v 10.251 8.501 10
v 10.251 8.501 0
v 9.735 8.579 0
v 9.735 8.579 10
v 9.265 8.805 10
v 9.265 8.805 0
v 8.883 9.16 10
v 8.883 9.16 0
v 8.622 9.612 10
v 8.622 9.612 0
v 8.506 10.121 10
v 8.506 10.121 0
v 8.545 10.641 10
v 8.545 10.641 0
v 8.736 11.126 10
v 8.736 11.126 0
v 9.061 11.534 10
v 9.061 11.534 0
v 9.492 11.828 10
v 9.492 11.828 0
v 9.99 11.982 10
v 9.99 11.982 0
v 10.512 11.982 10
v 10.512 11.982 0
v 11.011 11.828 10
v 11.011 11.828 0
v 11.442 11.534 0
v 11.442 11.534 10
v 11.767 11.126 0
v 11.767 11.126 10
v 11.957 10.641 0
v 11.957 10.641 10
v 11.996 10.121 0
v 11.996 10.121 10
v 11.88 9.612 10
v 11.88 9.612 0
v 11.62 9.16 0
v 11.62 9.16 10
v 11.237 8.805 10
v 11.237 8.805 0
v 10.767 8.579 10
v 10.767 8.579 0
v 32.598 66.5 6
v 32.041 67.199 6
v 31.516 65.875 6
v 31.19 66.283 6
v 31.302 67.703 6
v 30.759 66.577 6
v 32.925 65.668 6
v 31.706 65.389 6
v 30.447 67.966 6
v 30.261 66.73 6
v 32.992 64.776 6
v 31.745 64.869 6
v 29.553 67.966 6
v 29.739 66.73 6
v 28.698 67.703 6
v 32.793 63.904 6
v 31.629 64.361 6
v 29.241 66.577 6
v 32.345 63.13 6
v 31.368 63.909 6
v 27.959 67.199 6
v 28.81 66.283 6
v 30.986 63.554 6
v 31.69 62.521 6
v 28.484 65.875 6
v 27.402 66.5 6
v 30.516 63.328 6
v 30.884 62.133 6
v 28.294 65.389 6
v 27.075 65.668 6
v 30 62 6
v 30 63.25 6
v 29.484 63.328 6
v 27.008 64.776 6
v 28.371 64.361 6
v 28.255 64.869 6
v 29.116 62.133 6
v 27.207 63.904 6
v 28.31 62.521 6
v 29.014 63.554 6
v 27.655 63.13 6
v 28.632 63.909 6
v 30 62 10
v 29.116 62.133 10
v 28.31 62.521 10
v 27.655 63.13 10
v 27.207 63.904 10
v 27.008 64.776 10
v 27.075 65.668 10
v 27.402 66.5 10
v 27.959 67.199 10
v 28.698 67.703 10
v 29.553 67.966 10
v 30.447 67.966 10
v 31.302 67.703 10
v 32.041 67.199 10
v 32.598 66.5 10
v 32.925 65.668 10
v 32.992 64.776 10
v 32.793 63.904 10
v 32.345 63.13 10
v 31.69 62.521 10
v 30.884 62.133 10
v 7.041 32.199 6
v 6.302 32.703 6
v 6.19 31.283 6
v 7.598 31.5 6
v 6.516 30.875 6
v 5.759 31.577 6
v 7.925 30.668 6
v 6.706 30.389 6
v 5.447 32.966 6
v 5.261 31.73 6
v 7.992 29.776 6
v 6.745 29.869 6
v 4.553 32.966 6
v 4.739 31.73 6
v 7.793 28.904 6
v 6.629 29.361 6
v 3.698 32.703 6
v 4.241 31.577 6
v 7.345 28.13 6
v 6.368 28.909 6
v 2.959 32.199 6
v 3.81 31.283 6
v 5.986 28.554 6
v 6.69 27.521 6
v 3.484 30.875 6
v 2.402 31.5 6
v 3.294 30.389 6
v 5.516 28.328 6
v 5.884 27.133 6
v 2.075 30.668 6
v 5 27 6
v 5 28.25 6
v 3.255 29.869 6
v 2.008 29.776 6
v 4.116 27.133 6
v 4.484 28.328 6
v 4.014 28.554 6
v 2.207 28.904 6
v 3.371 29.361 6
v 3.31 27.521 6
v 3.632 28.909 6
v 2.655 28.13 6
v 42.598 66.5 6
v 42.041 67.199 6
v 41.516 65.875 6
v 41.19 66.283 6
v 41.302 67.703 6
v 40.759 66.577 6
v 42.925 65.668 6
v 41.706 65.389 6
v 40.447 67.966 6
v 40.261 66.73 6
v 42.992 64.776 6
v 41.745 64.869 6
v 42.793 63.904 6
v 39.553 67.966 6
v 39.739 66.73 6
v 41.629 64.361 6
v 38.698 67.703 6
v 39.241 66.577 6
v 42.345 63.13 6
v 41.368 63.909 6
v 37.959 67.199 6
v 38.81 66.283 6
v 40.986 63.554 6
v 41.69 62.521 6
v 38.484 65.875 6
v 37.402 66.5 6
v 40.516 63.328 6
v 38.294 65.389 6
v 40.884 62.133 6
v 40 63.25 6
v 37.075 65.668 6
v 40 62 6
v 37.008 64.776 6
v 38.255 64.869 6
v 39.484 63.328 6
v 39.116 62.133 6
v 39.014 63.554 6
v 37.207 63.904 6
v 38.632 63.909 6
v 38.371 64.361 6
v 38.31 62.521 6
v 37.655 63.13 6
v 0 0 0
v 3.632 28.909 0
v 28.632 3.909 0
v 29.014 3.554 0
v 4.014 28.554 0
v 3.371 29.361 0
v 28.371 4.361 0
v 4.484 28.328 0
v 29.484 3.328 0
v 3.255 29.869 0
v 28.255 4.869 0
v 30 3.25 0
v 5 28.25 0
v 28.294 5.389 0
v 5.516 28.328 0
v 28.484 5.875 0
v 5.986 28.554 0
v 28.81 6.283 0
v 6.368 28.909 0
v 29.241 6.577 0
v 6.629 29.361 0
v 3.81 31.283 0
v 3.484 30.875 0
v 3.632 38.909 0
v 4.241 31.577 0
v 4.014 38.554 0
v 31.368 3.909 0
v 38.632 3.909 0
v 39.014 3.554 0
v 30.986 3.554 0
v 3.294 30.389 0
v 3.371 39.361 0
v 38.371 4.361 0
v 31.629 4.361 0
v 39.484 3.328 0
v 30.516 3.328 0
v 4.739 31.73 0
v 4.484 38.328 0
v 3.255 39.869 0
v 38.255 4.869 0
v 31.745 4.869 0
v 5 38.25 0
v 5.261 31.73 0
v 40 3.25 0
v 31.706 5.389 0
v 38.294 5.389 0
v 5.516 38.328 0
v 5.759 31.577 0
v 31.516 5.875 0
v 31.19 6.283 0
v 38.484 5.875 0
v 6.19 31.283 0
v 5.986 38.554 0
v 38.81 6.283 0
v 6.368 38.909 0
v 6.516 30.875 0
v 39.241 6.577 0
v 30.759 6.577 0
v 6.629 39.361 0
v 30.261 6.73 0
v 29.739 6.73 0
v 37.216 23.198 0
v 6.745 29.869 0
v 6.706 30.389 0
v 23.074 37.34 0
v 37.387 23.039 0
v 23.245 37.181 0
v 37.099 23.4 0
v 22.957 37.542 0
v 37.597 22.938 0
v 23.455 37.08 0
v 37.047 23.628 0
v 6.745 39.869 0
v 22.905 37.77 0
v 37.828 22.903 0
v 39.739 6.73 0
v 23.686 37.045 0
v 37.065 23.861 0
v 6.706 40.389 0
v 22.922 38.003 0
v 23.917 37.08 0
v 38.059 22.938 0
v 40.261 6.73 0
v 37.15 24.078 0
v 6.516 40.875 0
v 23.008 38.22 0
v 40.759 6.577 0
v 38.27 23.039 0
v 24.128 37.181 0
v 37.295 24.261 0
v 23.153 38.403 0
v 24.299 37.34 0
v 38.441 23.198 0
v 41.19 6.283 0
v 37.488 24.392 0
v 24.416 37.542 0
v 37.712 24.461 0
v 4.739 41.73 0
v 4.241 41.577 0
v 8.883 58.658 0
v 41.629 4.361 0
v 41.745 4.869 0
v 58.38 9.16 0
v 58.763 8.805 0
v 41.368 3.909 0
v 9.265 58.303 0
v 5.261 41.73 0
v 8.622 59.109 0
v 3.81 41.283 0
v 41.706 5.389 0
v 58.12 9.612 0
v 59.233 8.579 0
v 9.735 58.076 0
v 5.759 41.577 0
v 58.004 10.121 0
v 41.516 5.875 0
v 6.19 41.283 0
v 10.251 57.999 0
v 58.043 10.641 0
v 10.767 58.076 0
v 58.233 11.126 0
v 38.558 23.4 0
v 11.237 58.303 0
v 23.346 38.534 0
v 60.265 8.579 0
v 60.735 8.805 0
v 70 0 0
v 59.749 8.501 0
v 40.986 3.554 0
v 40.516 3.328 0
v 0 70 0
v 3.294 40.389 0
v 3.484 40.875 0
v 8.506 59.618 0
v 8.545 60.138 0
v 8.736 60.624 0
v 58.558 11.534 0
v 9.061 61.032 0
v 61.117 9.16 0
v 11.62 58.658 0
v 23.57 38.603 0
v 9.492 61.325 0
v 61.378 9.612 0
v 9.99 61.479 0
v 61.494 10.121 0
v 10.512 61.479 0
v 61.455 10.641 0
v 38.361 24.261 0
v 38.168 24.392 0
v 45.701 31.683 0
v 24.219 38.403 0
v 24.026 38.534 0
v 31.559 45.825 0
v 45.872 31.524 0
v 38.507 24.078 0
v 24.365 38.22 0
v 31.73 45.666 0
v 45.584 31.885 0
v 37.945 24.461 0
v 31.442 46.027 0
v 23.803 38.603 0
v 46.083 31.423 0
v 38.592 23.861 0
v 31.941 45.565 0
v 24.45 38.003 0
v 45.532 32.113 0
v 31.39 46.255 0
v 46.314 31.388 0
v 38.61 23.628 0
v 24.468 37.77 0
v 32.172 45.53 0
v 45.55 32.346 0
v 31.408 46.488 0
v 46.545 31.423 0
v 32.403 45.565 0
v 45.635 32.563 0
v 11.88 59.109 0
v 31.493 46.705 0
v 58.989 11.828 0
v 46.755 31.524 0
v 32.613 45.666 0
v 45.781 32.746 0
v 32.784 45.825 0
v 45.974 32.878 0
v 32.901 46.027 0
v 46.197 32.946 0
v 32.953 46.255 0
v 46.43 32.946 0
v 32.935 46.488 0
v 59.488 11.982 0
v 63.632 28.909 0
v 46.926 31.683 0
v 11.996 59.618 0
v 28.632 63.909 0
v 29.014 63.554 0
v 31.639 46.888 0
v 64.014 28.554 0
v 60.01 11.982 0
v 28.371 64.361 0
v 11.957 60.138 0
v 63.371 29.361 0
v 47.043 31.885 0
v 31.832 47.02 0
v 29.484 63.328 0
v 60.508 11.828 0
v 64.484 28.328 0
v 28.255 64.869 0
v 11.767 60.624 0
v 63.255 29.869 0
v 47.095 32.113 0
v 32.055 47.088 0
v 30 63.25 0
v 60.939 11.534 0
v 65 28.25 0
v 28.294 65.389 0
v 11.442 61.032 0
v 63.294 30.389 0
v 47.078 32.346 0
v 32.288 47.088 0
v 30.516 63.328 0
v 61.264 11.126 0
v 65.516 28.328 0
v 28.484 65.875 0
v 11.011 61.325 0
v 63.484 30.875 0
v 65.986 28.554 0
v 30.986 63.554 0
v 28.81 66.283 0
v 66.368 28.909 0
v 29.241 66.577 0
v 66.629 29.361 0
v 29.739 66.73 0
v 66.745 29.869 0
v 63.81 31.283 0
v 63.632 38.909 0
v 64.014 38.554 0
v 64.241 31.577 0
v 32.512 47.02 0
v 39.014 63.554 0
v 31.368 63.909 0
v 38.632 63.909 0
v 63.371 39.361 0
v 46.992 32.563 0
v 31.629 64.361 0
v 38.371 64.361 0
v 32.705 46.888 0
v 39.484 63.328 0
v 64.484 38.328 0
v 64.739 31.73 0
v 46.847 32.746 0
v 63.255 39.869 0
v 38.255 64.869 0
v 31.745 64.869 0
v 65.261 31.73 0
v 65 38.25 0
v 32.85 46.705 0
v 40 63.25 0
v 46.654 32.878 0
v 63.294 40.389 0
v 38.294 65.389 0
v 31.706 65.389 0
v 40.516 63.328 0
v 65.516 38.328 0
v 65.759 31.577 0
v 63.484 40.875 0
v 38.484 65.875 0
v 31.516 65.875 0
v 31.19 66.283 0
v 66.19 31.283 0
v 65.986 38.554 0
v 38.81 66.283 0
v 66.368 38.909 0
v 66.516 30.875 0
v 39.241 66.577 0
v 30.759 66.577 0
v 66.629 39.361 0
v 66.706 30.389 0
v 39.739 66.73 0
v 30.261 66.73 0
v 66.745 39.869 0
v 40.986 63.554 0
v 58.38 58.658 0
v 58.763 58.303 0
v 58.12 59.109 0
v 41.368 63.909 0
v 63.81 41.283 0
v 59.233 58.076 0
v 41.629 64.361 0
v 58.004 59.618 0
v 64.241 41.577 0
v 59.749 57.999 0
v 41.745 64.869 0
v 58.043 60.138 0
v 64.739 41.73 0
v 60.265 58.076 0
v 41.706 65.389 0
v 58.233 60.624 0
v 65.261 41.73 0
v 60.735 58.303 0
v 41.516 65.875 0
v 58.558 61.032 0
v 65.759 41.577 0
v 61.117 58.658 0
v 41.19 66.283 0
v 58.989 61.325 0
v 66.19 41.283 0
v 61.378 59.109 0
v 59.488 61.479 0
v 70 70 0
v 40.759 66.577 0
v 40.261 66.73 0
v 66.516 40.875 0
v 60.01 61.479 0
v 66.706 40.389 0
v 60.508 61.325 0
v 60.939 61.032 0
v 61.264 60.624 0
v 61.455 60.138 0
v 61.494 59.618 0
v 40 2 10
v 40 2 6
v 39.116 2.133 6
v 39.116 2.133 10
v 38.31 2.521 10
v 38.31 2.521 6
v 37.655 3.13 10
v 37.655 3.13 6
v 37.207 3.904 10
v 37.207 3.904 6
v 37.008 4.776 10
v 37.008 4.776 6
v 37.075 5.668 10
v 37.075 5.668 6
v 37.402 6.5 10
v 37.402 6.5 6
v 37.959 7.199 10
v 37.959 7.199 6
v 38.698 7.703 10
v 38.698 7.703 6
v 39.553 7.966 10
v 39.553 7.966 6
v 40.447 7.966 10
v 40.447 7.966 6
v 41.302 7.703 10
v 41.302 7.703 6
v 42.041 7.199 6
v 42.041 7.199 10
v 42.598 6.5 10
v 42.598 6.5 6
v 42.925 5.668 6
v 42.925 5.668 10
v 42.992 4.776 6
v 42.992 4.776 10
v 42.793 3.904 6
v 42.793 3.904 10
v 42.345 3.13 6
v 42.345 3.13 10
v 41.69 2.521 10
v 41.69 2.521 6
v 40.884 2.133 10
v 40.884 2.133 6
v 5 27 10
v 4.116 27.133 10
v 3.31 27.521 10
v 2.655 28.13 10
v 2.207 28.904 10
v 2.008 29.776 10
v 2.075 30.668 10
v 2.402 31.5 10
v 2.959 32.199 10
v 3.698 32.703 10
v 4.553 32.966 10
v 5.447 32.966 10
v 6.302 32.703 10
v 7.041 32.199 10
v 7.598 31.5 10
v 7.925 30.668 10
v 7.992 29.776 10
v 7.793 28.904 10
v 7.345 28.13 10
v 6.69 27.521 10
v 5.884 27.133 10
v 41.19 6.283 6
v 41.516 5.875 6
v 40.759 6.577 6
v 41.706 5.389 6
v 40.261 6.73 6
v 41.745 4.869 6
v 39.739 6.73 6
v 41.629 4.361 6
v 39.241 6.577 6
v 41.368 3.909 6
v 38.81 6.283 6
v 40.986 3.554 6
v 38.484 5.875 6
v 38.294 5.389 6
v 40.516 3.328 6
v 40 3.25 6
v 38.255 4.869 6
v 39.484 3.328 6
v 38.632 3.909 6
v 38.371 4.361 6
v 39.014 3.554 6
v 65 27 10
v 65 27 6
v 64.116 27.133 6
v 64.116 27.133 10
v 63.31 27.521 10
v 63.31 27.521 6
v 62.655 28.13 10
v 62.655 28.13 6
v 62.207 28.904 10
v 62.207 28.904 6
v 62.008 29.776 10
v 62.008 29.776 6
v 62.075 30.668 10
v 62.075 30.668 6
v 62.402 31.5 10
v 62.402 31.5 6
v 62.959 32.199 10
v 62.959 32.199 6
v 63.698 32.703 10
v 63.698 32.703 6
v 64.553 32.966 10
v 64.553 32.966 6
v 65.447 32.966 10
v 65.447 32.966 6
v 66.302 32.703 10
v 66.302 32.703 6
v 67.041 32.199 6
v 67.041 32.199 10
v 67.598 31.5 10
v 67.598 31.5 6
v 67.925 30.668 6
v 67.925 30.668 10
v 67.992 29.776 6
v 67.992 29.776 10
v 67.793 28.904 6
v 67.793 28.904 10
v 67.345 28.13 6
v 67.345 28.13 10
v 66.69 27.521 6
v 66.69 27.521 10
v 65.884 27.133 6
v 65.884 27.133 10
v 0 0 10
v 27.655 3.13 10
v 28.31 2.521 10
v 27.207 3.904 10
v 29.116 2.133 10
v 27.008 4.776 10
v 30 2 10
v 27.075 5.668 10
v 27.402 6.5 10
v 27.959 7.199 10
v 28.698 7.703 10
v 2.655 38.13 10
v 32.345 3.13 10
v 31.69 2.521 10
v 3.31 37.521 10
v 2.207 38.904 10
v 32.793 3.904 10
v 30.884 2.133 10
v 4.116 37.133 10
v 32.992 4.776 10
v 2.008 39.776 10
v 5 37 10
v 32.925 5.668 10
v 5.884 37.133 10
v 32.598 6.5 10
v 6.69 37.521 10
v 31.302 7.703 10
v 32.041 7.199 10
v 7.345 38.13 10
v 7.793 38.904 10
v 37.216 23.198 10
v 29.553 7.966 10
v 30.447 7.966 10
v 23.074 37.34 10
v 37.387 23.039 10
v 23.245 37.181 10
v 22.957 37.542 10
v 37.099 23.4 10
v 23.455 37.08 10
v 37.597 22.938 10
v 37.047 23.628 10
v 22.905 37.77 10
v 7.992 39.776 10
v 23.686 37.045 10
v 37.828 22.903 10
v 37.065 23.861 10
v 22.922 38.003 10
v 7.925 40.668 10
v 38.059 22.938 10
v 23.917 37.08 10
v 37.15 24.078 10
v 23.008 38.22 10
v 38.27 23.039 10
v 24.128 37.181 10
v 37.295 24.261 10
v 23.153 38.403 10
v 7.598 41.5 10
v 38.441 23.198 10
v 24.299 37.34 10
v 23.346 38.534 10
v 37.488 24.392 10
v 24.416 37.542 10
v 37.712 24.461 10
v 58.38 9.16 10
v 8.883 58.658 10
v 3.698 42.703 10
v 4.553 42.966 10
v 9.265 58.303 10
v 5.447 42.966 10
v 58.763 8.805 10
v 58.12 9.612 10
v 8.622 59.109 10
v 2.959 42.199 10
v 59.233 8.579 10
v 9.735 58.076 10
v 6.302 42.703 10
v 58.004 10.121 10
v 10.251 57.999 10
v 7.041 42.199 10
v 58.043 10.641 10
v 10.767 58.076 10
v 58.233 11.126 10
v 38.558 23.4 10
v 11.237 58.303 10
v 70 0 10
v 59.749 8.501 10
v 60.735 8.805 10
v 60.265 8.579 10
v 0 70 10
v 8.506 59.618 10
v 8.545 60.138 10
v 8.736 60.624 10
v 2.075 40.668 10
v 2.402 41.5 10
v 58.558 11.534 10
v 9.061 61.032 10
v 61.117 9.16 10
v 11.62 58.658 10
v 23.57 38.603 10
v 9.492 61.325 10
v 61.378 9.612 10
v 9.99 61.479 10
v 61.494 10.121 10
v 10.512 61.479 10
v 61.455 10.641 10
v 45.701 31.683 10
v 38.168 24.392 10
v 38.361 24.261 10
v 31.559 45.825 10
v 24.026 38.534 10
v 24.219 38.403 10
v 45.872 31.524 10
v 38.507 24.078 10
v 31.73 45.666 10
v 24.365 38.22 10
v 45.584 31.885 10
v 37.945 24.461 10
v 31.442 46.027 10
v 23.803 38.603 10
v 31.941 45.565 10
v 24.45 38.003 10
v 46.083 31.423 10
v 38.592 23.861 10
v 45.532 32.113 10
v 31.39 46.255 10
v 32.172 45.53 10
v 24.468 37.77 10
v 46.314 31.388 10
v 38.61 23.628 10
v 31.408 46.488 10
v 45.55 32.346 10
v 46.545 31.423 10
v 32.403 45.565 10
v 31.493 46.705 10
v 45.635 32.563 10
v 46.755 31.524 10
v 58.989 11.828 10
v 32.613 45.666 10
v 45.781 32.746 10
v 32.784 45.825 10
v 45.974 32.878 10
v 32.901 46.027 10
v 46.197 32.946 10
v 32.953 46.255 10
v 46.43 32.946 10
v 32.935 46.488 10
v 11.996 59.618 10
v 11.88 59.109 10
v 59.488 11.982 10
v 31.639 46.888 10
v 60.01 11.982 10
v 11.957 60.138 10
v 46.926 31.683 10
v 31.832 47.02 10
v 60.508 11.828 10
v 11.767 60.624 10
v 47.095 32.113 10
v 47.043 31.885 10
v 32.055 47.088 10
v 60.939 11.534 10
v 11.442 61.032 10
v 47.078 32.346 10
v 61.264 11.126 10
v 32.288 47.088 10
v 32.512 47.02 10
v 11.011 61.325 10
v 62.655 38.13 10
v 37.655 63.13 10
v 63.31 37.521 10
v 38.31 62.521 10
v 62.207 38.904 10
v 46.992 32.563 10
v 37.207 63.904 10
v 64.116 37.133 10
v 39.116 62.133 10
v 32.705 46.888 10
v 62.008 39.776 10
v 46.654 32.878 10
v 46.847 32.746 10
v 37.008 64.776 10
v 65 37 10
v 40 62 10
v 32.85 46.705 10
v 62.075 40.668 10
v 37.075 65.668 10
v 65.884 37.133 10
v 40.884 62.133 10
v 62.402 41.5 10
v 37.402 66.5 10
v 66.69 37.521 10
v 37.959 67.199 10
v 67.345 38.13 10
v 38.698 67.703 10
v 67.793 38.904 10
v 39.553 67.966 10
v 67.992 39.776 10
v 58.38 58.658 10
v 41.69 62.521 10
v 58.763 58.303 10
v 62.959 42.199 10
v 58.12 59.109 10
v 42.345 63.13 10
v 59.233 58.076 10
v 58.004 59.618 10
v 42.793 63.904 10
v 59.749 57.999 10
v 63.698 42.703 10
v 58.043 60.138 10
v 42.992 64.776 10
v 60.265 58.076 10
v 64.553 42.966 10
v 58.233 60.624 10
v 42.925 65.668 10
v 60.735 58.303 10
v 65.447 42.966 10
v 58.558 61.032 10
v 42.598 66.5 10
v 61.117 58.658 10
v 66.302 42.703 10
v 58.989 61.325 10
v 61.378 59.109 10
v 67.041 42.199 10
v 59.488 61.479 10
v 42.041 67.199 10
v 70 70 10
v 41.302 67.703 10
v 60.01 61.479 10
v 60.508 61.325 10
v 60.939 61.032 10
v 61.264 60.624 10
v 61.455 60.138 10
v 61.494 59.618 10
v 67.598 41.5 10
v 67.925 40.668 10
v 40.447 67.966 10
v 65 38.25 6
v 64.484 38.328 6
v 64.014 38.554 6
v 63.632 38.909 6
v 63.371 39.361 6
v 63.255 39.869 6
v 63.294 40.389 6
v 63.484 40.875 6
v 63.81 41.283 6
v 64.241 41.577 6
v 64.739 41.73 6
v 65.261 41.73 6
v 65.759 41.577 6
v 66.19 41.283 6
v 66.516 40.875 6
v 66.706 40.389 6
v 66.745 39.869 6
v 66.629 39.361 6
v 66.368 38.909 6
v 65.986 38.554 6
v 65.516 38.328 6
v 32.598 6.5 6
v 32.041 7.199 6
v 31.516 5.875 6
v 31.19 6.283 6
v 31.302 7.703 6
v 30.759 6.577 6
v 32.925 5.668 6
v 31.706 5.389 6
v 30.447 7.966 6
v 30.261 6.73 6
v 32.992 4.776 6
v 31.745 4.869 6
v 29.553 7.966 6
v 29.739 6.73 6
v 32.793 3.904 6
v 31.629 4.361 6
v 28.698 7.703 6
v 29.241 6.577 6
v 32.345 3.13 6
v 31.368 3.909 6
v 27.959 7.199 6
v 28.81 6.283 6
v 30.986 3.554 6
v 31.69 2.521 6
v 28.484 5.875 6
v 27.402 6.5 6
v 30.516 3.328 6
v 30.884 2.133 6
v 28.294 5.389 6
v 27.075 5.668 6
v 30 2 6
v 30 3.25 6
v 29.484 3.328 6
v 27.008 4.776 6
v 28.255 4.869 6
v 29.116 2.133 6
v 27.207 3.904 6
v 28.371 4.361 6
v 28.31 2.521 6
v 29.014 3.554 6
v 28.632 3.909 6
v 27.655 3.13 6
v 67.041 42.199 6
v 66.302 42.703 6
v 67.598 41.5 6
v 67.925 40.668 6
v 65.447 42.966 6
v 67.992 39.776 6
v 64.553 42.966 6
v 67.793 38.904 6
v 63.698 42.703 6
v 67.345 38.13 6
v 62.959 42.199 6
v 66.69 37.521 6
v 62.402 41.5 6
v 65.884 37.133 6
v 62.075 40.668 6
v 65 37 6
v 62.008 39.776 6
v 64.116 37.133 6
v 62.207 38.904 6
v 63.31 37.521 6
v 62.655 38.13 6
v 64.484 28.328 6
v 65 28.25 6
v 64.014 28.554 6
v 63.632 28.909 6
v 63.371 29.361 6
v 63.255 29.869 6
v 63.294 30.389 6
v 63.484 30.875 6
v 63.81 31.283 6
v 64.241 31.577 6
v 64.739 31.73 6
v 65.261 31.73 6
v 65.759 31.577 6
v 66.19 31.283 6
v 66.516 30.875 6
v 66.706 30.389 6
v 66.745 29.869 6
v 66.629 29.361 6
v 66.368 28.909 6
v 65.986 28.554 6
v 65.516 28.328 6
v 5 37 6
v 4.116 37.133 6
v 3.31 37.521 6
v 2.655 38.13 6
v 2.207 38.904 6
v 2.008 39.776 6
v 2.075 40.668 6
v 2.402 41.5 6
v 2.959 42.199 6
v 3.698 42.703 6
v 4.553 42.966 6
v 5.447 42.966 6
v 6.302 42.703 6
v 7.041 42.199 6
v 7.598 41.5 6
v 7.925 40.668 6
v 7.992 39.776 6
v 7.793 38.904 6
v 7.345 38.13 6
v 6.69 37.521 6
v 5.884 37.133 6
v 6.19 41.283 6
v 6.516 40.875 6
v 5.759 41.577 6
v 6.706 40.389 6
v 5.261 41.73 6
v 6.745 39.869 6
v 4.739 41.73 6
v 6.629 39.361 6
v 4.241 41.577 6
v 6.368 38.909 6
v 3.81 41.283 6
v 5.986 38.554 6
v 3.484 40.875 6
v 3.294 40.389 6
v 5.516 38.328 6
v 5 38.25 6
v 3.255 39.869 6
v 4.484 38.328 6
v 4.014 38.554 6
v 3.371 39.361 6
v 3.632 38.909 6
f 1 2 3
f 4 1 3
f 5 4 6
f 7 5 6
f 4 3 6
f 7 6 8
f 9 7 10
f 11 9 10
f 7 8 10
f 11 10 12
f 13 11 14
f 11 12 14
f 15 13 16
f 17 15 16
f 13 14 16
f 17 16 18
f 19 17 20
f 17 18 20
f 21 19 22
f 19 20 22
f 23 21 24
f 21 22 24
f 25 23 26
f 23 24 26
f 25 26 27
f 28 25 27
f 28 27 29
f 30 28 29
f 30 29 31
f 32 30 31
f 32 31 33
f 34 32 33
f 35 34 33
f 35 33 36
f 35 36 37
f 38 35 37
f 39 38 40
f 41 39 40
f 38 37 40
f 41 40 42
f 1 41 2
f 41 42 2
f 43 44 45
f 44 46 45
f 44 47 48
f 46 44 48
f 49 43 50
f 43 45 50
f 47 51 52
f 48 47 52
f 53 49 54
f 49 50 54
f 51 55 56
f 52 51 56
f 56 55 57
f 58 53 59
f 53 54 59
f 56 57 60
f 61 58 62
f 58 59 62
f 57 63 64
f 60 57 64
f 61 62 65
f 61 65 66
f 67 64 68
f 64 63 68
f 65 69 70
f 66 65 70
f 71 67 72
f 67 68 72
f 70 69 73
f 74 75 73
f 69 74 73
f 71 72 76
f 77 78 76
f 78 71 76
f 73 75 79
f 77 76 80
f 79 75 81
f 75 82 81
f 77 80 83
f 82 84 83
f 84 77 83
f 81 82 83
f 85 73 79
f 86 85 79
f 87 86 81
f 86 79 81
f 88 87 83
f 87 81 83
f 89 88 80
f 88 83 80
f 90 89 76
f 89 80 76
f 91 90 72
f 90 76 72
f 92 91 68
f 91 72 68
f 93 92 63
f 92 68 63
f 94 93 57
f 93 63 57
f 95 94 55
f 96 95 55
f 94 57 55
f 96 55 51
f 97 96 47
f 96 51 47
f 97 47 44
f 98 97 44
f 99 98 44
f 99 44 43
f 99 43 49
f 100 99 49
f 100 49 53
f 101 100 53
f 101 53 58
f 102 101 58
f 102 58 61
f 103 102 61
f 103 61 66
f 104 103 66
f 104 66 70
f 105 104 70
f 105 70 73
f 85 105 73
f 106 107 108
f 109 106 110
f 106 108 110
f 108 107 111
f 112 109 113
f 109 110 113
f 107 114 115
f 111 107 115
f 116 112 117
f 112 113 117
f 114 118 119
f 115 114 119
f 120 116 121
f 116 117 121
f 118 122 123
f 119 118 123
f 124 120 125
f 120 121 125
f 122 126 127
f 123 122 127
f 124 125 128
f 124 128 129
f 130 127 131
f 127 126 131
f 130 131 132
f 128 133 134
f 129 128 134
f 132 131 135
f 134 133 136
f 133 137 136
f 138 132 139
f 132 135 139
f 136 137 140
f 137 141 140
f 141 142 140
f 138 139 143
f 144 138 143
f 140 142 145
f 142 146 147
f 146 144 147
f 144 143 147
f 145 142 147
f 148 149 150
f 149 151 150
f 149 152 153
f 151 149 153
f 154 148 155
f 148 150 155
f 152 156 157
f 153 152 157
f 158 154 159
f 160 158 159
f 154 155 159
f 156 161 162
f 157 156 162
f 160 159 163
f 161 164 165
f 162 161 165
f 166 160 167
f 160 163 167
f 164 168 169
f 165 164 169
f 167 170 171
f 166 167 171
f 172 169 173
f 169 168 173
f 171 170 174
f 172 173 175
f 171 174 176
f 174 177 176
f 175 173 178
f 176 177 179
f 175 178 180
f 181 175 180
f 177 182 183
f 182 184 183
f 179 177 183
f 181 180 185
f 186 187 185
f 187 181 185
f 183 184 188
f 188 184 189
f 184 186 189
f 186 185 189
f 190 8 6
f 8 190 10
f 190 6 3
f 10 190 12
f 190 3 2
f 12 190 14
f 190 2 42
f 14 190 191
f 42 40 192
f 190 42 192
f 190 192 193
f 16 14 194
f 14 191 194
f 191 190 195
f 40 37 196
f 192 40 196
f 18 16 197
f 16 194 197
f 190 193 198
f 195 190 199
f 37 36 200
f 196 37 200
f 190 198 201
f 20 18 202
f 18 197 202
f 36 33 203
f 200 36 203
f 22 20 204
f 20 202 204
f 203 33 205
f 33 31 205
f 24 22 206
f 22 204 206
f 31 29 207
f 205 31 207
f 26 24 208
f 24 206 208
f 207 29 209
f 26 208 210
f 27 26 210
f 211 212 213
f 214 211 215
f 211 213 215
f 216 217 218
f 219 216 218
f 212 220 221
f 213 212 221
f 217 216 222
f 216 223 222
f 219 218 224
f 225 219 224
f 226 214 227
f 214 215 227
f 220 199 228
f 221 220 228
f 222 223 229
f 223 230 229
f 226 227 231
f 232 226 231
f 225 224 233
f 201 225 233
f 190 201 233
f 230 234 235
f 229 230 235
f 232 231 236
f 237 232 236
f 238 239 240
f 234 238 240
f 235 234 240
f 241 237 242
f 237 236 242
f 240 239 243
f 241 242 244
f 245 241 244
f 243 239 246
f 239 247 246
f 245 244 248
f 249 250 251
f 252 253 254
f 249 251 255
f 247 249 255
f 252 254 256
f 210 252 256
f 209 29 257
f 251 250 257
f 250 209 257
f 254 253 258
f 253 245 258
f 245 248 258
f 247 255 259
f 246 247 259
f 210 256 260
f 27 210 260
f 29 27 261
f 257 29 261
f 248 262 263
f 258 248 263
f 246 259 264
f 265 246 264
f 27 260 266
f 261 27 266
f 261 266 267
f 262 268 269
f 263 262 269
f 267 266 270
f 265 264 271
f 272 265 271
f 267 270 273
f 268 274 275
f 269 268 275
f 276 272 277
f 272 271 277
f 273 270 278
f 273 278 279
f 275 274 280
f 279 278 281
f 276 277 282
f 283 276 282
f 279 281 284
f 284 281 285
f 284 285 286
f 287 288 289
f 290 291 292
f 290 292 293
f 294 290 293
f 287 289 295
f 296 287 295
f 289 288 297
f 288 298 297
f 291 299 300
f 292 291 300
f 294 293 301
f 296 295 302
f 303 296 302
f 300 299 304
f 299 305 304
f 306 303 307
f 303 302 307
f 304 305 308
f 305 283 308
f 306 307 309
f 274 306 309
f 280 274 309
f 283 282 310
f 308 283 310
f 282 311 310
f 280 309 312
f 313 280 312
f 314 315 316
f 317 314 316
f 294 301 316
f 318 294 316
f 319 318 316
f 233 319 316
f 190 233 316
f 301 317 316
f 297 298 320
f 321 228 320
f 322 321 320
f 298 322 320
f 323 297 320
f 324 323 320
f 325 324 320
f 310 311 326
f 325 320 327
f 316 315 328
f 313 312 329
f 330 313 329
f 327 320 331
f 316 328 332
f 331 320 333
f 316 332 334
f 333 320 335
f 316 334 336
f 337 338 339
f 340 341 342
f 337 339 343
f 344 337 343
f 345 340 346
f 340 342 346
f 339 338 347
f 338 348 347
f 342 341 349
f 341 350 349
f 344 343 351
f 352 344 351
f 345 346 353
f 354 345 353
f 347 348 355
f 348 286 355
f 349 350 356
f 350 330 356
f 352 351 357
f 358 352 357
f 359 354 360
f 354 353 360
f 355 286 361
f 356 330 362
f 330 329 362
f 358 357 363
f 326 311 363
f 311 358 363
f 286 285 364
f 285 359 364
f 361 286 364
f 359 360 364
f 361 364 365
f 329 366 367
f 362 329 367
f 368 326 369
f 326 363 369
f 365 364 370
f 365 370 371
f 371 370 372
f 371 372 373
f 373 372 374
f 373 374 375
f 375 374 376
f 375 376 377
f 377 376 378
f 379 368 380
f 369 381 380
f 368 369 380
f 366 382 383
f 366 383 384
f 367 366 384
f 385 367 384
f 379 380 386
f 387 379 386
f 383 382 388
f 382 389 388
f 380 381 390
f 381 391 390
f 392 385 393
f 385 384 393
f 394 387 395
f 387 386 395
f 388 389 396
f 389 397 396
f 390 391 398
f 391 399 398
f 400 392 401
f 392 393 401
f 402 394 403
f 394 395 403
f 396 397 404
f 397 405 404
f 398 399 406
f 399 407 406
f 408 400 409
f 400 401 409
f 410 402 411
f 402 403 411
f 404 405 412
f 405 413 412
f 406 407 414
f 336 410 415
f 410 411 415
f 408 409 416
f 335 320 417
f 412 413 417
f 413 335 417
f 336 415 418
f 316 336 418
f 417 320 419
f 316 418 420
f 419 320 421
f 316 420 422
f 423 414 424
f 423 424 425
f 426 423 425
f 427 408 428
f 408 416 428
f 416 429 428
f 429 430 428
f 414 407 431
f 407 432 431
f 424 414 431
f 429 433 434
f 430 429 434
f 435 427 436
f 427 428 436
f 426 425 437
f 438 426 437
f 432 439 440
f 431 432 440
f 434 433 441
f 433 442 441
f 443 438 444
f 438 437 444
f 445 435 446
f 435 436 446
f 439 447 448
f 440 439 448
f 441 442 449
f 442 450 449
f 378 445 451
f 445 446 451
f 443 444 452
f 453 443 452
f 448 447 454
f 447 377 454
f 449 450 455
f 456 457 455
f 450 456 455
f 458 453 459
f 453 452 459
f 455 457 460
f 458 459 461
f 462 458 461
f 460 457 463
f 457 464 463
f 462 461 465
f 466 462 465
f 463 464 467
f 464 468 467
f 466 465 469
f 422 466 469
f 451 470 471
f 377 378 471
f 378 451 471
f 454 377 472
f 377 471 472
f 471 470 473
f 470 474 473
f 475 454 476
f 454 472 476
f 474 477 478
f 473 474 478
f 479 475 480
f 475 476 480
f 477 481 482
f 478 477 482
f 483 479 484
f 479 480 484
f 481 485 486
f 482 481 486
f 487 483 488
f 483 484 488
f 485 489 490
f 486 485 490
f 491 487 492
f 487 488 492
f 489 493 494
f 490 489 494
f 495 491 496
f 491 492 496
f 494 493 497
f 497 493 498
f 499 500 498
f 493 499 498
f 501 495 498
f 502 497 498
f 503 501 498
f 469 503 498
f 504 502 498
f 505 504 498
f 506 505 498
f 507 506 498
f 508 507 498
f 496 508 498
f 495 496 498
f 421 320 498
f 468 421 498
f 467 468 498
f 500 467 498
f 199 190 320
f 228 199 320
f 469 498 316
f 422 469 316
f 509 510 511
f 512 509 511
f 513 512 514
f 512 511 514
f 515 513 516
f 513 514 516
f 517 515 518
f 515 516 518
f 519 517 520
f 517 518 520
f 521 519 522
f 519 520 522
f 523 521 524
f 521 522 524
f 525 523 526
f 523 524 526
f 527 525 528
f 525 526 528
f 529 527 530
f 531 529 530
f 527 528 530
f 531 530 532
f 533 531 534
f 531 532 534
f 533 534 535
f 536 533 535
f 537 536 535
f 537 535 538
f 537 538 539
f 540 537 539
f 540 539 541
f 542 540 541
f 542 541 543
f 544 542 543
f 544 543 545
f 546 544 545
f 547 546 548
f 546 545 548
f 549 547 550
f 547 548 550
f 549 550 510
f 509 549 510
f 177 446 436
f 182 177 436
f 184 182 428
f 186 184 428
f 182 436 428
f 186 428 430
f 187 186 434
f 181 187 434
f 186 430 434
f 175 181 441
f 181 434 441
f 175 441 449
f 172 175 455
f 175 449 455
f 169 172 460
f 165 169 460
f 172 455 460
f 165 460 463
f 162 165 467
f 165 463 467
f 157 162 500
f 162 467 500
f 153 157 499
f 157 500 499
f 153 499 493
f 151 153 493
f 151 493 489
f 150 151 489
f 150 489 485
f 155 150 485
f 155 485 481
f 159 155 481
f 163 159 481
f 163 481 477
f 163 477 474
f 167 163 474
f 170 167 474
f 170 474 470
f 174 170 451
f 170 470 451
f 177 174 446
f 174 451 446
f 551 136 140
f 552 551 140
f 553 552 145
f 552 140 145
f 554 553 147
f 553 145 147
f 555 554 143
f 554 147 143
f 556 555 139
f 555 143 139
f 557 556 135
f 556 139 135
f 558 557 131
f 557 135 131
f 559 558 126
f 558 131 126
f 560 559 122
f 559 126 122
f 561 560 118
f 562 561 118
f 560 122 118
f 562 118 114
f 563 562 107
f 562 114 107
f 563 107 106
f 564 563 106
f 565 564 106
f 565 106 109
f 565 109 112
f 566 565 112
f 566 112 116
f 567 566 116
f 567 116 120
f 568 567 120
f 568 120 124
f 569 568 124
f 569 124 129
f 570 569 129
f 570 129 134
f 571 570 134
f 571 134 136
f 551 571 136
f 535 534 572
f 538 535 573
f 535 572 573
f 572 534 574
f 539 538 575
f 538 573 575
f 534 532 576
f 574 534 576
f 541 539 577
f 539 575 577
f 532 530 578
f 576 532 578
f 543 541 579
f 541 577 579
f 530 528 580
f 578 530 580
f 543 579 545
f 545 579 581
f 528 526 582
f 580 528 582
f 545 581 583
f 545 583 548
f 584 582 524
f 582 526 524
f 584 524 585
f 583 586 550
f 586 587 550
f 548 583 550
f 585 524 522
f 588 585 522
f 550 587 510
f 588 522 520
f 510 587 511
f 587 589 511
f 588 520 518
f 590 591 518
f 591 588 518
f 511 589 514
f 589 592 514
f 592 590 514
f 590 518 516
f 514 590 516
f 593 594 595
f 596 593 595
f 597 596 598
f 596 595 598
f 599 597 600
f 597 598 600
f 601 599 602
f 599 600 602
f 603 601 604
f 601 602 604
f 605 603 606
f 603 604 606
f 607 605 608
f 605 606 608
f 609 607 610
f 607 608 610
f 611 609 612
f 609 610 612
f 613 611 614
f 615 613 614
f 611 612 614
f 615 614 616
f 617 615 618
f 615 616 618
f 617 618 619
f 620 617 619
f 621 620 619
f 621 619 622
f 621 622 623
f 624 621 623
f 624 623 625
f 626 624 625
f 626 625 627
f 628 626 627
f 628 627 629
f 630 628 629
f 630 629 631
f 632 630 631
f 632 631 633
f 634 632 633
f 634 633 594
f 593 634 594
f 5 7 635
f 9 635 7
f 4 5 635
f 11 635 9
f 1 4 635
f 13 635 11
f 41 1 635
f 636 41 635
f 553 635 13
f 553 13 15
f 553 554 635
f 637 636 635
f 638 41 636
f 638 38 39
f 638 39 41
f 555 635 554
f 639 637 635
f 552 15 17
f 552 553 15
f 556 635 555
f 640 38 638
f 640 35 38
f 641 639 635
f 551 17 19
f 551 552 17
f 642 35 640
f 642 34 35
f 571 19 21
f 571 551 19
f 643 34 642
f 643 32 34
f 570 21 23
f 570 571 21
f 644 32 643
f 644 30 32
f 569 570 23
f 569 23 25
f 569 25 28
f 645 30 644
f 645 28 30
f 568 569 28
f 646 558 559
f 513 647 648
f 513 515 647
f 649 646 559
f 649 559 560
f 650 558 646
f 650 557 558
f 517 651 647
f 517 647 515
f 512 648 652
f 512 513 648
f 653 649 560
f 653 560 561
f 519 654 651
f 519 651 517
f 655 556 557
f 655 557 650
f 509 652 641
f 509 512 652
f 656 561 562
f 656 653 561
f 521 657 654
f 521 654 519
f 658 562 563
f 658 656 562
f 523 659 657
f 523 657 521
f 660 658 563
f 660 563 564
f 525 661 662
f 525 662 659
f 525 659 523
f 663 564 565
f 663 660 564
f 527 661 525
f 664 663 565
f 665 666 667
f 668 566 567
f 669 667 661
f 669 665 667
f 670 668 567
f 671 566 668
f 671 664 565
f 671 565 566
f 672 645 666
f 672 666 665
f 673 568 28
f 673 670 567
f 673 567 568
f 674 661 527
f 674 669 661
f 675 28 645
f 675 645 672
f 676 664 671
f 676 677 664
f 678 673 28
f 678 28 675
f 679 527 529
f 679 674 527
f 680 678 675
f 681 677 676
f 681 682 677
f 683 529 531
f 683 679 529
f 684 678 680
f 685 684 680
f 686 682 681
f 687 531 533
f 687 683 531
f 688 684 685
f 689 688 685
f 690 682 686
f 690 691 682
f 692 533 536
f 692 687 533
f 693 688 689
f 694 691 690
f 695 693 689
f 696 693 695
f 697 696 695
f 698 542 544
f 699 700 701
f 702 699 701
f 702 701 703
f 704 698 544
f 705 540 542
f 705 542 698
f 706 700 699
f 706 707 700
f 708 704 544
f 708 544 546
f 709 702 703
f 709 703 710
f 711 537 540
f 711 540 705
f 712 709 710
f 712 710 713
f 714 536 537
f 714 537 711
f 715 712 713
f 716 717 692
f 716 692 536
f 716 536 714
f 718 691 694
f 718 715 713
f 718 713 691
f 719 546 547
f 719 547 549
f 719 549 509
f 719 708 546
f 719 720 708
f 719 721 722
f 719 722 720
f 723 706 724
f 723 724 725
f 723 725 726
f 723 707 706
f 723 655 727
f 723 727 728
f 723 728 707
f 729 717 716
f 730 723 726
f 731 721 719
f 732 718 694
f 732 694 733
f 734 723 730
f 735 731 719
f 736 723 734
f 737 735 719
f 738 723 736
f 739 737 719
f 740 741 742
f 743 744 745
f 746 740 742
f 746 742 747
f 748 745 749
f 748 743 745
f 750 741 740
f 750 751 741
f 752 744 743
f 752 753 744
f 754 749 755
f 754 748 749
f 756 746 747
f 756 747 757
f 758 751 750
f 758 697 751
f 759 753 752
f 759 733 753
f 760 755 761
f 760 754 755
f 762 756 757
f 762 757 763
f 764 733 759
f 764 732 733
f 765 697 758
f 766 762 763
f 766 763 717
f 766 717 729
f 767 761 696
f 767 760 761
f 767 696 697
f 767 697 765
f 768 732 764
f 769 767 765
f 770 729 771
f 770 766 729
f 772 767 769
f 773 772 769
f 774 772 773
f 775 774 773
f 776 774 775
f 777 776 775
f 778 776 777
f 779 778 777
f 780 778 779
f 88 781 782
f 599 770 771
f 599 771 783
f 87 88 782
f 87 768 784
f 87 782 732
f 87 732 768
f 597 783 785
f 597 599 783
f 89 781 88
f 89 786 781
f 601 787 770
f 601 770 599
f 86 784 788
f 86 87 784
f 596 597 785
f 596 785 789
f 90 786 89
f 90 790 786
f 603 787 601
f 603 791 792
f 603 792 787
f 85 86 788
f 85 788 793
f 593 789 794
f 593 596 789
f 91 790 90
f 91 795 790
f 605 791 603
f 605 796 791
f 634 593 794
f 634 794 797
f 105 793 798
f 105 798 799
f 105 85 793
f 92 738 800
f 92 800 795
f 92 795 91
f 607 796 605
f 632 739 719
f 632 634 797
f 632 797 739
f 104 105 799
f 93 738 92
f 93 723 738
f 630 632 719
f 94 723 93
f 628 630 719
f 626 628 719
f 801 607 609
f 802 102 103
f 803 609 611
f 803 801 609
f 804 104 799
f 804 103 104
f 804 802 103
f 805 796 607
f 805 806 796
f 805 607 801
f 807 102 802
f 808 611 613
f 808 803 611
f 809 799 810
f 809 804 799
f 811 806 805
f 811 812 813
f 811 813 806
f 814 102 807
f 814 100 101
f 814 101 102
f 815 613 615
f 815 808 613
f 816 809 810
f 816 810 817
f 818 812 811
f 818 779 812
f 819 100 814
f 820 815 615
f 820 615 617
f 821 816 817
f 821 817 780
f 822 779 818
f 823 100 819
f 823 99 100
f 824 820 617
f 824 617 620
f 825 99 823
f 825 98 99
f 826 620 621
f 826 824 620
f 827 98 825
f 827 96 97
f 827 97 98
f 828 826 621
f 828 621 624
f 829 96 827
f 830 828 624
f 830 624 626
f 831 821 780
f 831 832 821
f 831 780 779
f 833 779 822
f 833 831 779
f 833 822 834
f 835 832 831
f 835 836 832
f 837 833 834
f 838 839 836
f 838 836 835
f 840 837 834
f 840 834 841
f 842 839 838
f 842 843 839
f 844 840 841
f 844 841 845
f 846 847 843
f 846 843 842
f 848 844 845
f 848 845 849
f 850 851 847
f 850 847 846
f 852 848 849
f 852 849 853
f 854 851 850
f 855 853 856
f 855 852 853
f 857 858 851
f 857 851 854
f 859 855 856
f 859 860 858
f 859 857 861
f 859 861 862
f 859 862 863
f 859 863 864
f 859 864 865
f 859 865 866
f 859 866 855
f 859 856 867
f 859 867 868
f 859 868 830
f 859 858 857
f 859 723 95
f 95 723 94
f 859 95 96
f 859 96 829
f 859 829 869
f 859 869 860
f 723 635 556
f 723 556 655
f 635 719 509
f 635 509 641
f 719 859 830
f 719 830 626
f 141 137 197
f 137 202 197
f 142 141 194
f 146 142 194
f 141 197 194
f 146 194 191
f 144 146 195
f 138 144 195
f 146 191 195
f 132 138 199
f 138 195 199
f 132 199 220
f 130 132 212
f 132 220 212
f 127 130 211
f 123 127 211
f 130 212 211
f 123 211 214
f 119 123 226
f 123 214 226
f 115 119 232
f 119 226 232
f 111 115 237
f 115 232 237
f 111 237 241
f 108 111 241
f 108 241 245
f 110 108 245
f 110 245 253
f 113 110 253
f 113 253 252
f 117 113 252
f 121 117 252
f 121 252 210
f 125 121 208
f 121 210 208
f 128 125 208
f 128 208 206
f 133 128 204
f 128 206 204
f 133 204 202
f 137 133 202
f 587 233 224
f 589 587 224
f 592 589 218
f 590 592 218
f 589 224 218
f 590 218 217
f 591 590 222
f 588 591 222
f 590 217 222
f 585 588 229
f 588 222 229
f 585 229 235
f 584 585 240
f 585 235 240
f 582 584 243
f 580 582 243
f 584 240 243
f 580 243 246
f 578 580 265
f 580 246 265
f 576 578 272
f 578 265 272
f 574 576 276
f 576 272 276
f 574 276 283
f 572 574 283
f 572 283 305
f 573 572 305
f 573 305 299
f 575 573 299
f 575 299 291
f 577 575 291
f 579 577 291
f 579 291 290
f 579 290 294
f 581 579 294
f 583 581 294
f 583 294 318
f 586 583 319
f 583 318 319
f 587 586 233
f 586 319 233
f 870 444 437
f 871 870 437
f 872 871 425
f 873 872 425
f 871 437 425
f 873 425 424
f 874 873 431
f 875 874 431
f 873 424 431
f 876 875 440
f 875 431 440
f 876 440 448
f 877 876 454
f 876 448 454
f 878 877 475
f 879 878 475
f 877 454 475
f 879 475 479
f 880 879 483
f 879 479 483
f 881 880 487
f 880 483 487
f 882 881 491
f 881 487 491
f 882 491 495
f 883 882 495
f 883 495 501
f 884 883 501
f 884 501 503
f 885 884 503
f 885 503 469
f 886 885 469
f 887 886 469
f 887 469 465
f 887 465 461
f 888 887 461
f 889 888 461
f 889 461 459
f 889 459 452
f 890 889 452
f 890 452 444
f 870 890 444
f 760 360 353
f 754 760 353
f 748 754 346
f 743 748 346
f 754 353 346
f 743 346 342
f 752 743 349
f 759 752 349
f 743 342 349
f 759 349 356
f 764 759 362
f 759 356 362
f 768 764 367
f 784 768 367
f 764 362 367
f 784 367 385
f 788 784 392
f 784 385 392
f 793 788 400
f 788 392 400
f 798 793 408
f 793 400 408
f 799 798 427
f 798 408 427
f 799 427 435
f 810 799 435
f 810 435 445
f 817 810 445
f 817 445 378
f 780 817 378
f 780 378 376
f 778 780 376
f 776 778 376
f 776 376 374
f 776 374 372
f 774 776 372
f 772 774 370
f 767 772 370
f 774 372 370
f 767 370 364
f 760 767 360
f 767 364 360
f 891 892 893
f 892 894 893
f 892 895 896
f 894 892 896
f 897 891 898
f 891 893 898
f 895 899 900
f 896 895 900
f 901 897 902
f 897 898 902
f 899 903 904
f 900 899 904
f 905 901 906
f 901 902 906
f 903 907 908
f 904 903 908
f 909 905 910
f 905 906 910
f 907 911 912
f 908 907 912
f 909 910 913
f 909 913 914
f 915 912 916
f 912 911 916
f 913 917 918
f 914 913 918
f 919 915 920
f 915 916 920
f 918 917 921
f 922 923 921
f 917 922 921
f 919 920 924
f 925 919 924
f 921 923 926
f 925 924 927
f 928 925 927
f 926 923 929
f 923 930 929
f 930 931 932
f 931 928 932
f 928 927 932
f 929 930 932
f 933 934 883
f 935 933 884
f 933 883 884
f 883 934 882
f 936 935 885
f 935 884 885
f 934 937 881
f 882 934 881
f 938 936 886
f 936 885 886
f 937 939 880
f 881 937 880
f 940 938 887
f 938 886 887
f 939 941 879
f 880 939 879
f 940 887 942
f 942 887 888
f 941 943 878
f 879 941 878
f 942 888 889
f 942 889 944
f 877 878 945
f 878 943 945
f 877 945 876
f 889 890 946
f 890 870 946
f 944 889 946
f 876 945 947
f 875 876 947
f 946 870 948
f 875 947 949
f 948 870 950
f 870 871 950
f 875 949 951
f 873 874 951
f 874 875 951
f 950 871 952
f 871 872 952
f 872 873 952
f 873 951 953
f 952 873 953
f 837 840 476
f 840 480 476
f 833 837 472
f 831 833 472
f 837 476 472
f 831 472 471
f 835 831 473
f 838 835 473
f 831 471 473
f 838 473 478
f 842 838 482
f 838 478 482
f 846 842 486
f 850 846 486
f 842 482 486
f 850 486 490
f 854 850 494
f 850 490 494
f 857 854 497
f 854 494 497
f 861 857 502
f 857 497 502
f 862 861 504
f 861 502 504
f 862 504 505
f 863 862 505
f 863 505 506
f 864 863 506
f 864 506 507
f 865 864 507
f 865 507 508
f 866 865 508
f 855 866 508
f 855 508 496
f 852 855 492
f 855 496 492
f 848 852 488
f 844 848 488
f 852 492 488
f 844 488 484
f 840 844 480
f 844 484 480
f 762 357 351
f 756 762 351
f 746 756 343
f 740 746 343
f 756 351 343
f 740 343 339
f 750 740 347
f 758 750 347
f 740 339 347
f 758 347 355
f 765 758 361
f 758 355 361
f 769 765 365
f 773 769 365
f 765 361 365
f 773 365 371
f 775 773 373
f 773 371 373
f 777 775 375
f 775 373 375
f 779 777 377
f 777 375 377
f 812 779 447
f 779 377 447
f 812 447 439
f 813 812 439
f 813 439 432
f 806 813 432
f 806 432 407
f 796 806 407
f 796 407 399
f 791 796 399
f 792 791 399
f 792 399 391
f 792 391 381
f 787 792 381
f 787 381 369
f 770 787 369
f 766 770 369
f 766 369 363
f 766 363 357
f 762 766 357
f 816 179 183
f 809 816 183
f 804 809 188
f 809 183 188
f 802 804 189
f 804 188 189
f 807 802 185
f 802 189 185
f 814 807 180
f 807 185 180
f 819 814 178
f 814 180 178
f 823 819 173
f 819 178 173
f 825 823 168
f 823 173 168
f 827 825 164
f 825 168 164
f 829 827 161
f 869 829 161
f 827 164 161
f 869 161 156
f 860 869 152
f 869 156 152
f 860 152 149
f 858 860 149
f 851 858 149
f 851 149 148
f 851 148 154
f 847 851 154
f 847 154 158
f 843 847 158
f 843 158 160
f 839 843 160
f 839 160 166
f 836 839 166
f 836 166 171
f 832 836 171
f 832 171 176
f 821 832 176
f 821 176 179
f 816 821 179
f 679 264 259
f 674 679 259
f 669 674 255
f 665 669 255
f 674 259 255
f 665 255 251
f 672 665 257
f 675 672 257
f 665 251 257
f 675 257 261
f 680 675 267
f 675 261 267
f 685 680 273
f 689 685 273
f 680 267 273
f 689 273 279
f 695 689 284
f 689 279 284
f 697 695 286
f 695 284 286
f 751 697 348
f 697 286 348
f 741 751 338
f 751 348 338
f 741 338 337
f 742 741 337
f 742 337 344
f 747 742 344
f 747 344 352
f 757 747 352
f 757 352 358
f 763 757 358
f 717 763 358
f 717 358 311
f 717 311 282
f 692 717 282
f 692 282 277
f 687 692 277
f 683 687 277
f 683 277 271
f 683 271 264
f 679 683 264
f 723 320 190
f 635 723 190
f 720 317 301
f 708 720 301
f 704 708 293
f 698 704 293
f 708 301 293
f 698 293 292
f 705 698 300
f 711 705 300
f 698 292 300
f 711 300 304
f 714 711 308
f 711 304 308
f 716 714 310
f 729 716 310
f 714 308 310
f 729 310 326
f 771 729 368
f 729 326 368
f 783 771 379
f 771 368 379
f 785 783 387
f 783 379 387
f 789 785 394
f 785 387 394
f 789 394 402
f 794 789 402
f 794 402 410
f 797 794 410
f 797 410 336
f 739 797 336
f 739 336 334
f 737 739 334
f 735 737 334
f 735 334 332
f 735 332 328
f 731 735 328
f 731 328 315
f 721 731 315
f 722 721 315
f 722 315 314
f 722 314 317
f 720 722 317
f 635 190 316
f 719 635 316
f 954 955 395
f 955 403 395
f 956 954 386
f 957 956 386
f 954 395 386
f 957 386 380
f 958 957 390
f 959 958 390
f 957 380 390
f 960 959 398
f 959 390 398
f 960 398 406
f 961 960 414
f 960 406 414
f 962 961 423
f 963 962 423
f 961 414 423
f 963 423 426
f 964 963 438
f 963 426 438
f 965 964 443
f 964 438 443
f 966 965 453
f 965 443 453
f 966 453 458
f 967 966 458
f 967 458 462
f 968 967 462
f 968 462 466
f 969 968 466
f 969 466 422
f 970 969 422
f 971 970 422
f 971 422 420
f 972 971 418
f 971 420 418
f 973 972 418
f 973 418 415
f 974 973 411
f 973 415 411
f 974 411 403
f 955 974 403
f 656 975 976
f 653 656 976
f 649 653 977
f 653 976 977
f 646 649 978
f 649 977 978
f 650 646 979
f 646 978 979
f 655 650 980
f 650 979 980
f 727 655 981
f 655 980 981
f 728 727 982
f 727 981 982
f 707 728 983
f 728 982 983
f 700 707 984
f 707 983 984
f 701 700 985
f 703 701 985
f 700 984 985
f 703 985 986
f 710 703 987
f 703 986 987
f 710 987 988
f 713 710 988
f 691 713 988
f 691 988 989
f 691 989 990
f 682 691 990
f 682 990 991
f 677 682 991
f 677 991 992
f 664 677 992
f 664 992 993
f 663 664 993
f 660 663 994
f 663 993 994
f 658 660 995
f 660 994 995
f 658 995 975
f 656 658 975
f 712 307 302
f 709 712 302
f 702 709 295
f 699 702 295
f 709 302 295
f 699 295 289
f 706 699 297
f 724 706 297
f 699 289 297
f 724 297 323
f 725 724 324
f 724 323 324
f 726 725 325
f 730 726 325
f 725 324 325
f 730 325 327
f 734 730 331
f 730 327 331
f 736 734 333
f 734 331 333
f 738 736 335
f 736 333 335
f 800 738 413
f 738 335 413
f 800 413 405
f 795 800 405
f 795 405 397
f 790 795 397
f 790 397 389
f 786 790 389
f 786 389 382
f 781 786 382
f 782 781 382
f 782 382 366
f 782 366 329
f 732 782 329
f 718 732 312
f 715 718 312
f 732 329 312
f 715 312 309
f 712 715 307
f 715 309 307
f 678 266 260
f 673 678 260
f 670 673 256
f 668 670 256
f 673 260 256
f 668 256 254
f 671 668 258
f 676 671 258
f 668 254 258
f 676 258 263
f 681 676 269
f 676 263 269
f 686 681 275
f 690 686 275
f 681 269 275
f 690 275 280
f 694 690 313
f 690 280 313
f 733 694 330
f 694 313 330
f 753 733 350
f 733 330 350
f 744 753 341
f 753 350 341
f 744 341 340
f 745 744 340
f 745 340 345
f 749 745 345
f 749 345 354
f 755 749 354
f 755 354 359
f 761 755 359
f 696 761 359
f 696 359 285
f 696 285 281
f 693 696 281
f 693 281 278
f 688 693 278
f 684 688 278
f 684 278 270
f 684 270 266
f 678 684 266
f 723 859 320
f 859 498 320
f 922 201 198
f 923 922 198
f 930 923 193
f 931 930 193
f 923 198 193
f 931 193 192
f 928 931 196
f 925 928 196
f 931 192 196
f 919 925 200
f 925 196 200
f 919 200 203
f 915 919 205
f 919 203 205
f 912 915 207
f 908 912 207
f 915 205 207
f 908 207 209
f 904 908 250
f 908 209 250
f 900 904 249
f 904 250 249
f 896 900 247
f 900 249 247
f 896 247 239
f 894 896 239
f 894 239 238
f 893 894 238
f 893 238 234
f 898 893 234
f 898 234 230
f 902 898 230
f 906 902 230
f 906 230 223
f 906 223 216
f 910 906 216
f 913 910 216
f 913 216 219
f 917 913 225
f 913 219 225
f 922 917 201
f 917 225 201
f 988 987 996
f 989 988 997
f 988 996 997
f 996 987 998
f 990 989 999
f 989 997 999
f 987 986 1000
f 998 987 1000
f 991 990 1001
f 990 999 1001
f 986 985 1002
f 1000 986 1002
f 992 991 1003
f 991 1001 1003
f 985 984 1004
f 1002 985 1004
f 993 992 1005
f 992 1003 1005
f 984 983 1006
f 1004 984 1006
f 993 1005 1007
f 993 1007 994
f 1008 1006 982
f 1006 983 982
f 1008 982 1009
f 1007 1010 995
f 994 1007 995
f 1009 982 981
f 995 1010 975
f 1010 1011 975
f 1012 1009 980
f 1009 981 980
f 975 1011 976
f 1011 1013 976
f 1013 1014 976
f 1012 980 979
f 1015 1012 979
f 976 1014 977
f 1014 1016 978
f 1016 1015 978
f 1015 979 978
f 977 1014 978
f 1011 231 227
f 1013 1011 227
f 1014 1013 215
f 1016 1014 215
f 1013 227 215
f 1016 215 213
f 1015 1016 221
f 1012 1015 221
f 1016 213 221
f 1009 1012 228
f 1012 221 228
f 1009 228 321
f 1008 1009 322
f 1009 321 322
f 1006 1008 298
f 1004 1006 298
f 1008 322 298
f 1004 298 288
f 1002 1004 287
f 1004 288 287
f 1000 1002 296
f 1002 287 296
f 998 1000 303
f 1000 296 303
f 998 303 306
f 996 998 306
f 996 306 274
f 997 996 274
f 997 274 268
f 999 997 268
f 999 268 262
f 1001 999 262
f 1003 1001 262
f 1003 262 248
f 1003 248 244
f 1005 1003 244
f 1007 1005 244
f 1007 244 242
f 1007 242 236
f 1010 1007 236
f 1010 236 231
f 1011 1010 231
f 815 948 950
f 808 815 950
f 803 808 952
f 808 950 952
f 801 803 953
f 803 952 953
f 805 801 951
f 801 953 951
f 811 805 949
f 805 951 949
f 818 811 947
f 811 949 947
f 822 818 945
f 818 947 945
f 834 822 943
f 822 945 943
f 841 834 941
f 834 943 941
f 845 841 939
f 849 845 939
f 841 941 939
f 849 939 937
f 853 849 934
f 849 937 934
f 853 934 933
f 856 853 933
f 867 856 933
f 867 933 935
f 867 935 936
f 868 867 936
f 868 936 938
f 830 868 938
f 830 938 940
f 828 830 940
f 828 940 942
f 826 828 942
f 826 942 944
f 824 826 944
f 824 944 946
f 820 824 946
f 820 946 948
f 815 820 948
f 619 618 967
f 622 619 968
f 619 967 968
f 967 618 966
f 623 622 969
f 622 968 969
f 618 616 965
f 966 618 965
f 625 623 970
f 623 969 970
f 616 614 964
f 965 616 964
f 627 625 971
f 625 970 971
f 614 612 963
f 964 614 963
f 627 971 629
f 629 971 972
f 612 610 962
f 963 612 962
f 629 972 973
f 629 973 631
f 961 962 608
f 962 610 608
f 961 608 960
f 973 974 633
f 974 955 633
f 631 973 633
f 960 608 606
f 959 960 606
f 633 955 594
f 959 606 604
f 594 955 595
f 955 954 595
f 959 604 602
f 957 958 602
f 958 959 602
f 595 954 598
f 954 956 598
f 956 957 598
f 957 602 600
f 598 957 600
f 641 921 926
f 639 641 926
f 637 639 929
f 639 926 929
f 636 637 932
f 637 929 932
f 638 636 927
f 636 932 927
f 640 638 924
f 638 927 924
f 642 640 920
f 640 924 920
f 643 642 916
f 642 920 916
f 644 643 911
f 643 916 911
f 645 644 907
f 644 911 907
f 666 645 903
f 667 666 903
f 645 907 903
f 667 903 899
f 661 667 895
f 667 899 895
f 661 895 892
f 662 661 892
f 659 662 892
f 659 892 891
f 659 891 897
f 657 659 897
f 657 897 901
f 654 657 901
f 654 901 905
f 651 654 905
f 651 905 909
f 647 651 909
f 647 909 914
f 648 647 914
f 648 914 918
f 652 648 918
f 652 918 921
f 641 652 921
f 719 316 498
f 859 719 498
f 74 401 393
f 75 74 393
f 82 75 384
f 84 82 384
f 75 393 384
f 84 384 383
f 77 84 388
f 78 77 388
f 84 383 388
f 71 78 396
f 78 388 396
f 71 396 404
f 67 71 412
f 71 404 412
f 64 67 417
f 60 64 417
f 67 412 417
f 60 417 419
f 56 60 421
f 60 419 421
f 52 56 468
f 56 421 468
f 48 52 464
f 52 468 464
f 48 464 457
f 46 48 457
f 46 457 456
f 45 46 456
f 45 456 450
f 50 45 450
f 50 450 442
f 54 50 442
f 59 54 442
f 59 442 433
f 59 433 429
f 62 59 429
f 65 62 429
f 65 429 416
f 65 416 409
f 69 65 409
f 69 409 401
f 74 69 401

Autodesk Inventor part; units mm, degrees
ref_plane "YZ Plane" through (0, 0, 0) normal (1, 0, 0) x (0, 1, 0)
ref_plane "XZ Plane" through (0, 0, 0) normal (0, 1, 0) x (-1, 0, 0)
ref_plane "XY Plane" through (0, 0, 0) normal (0, 0, 1) x (1, 0, 0)
sketch "スケッチ1" plane through (0, 0, 0) normal (0, 0, 1) x (1, 0, 0)
  line L0 (0, 0) -> (70, 0)
  line L1 (70, 0) -> (70, 70)
  line L2 (70, 70) -> (0, 70)
  line L3 (0, 70) -> (0, 0)
  dimension "d0" = 70
  dimension "d1" = 70
extrude "押し出し1" add sketch "スケッチ1" along normal blind 10
sketch "スケッチ2" plane through (0, 0, 10) normal (0, 0, 1) x (1, 0, 0)
  line L0 (70, 70) -> (0, 70) projected
  line L1 (70, 0) -> (70, 70) projected
  line L2 (0, 0) -> (70, 0) projected
  line L3 (35, 70) -> (35, 0)
  point P0 (40, 65)
  point P1 (65, 40)
  point P2 (65, 30)
  point P3 (40, 5)
  point P4 (30, 65)
  point P5 (5, 40)
  point P6 (5, 30)
  point P7 (30, 5)
  dimension "d4" = 5
  dimension "d5" = 5
  dimension "d6" = 5
  dimension "d7" = 5
  dimension "d8" = 30
  dimension "d9" = 30
  dimension "d10" = 30
  dimension "d11" = 30
hole "穴1" at (40, 65, 10) at (65, 40, 10) at (65, 30, 10) at (40, 5, 10) at (30, 65, 10) at (5, 40, 10) at (5, 30, 10) at (30, 5, 10) direction (0, 0, -1) diameter 3.5 end through all counterbore diameter 6 counterbore depth 4
sketch "スケッチ10" plane through (0, 0, 10) normal (0, 0, 1) x (1, 0, 0)
  line L0 (0, 70) -> (0, 0) projected
  line L1 (70, 70) -> (0, 70) projected
  line L2 (0, 0) -> (70, 70)
  line L3 (70, 0) -> (70, 70) projected
  line L4 (70, 0) -> (0, 70)
  point P0 (10.2513, 59.7487)
  point P1 (59.7487, 10.2513)
  point P2 (10.2513, 10.2513)
  point P3 (59.7487, 59.7487)
  dimension "d41" = 70
  dimension "d42" = 70
hole "穴3" at (10.2513, 59.7487, 10) at (59.7487, 10.2513, 10) at (10.2513, 10.2513, 10) at (59.7487, 59.7487, 10) direction (0, 0, -1) diameter 3.5 end through all
sketch "スケッチ13" plane through (0, 0, 10) normal (0, 0, 1) x (1, 0, 0)
  line L0 (0, 70) -> (0, 0) projected
  line L1 (0, 0) -> (70, 0) projected
  line L2 (0, 70) -> (70, 0)
  line L3 (70, 70) -> (0, 70) projected
  line L4 (70, 70) -> (0, 0)
  point P0 (23.6863, 37.8284)
  point P1 (37.8284, 23.6863)
  point P2 (32.1716, 46.3137)
  point P3 (46.3137, 32.1716)
  dimension "d85" = 12
  dimension "d86" = 20
  dimension "d89" = 20
  dimension "d92" = 12
hole "穴6" at (23.6863, 37.8284, 10) at (37.8284, 23.6863, 10) at (32.1716, 46.3137, 10) at (46.3137, 32.1716, 10) direction (0, 0, -1) diameter 1.567 end through all thread size "M2x0.4" class "6H" standard "ISO Metric profile"
properties part number "土台"
